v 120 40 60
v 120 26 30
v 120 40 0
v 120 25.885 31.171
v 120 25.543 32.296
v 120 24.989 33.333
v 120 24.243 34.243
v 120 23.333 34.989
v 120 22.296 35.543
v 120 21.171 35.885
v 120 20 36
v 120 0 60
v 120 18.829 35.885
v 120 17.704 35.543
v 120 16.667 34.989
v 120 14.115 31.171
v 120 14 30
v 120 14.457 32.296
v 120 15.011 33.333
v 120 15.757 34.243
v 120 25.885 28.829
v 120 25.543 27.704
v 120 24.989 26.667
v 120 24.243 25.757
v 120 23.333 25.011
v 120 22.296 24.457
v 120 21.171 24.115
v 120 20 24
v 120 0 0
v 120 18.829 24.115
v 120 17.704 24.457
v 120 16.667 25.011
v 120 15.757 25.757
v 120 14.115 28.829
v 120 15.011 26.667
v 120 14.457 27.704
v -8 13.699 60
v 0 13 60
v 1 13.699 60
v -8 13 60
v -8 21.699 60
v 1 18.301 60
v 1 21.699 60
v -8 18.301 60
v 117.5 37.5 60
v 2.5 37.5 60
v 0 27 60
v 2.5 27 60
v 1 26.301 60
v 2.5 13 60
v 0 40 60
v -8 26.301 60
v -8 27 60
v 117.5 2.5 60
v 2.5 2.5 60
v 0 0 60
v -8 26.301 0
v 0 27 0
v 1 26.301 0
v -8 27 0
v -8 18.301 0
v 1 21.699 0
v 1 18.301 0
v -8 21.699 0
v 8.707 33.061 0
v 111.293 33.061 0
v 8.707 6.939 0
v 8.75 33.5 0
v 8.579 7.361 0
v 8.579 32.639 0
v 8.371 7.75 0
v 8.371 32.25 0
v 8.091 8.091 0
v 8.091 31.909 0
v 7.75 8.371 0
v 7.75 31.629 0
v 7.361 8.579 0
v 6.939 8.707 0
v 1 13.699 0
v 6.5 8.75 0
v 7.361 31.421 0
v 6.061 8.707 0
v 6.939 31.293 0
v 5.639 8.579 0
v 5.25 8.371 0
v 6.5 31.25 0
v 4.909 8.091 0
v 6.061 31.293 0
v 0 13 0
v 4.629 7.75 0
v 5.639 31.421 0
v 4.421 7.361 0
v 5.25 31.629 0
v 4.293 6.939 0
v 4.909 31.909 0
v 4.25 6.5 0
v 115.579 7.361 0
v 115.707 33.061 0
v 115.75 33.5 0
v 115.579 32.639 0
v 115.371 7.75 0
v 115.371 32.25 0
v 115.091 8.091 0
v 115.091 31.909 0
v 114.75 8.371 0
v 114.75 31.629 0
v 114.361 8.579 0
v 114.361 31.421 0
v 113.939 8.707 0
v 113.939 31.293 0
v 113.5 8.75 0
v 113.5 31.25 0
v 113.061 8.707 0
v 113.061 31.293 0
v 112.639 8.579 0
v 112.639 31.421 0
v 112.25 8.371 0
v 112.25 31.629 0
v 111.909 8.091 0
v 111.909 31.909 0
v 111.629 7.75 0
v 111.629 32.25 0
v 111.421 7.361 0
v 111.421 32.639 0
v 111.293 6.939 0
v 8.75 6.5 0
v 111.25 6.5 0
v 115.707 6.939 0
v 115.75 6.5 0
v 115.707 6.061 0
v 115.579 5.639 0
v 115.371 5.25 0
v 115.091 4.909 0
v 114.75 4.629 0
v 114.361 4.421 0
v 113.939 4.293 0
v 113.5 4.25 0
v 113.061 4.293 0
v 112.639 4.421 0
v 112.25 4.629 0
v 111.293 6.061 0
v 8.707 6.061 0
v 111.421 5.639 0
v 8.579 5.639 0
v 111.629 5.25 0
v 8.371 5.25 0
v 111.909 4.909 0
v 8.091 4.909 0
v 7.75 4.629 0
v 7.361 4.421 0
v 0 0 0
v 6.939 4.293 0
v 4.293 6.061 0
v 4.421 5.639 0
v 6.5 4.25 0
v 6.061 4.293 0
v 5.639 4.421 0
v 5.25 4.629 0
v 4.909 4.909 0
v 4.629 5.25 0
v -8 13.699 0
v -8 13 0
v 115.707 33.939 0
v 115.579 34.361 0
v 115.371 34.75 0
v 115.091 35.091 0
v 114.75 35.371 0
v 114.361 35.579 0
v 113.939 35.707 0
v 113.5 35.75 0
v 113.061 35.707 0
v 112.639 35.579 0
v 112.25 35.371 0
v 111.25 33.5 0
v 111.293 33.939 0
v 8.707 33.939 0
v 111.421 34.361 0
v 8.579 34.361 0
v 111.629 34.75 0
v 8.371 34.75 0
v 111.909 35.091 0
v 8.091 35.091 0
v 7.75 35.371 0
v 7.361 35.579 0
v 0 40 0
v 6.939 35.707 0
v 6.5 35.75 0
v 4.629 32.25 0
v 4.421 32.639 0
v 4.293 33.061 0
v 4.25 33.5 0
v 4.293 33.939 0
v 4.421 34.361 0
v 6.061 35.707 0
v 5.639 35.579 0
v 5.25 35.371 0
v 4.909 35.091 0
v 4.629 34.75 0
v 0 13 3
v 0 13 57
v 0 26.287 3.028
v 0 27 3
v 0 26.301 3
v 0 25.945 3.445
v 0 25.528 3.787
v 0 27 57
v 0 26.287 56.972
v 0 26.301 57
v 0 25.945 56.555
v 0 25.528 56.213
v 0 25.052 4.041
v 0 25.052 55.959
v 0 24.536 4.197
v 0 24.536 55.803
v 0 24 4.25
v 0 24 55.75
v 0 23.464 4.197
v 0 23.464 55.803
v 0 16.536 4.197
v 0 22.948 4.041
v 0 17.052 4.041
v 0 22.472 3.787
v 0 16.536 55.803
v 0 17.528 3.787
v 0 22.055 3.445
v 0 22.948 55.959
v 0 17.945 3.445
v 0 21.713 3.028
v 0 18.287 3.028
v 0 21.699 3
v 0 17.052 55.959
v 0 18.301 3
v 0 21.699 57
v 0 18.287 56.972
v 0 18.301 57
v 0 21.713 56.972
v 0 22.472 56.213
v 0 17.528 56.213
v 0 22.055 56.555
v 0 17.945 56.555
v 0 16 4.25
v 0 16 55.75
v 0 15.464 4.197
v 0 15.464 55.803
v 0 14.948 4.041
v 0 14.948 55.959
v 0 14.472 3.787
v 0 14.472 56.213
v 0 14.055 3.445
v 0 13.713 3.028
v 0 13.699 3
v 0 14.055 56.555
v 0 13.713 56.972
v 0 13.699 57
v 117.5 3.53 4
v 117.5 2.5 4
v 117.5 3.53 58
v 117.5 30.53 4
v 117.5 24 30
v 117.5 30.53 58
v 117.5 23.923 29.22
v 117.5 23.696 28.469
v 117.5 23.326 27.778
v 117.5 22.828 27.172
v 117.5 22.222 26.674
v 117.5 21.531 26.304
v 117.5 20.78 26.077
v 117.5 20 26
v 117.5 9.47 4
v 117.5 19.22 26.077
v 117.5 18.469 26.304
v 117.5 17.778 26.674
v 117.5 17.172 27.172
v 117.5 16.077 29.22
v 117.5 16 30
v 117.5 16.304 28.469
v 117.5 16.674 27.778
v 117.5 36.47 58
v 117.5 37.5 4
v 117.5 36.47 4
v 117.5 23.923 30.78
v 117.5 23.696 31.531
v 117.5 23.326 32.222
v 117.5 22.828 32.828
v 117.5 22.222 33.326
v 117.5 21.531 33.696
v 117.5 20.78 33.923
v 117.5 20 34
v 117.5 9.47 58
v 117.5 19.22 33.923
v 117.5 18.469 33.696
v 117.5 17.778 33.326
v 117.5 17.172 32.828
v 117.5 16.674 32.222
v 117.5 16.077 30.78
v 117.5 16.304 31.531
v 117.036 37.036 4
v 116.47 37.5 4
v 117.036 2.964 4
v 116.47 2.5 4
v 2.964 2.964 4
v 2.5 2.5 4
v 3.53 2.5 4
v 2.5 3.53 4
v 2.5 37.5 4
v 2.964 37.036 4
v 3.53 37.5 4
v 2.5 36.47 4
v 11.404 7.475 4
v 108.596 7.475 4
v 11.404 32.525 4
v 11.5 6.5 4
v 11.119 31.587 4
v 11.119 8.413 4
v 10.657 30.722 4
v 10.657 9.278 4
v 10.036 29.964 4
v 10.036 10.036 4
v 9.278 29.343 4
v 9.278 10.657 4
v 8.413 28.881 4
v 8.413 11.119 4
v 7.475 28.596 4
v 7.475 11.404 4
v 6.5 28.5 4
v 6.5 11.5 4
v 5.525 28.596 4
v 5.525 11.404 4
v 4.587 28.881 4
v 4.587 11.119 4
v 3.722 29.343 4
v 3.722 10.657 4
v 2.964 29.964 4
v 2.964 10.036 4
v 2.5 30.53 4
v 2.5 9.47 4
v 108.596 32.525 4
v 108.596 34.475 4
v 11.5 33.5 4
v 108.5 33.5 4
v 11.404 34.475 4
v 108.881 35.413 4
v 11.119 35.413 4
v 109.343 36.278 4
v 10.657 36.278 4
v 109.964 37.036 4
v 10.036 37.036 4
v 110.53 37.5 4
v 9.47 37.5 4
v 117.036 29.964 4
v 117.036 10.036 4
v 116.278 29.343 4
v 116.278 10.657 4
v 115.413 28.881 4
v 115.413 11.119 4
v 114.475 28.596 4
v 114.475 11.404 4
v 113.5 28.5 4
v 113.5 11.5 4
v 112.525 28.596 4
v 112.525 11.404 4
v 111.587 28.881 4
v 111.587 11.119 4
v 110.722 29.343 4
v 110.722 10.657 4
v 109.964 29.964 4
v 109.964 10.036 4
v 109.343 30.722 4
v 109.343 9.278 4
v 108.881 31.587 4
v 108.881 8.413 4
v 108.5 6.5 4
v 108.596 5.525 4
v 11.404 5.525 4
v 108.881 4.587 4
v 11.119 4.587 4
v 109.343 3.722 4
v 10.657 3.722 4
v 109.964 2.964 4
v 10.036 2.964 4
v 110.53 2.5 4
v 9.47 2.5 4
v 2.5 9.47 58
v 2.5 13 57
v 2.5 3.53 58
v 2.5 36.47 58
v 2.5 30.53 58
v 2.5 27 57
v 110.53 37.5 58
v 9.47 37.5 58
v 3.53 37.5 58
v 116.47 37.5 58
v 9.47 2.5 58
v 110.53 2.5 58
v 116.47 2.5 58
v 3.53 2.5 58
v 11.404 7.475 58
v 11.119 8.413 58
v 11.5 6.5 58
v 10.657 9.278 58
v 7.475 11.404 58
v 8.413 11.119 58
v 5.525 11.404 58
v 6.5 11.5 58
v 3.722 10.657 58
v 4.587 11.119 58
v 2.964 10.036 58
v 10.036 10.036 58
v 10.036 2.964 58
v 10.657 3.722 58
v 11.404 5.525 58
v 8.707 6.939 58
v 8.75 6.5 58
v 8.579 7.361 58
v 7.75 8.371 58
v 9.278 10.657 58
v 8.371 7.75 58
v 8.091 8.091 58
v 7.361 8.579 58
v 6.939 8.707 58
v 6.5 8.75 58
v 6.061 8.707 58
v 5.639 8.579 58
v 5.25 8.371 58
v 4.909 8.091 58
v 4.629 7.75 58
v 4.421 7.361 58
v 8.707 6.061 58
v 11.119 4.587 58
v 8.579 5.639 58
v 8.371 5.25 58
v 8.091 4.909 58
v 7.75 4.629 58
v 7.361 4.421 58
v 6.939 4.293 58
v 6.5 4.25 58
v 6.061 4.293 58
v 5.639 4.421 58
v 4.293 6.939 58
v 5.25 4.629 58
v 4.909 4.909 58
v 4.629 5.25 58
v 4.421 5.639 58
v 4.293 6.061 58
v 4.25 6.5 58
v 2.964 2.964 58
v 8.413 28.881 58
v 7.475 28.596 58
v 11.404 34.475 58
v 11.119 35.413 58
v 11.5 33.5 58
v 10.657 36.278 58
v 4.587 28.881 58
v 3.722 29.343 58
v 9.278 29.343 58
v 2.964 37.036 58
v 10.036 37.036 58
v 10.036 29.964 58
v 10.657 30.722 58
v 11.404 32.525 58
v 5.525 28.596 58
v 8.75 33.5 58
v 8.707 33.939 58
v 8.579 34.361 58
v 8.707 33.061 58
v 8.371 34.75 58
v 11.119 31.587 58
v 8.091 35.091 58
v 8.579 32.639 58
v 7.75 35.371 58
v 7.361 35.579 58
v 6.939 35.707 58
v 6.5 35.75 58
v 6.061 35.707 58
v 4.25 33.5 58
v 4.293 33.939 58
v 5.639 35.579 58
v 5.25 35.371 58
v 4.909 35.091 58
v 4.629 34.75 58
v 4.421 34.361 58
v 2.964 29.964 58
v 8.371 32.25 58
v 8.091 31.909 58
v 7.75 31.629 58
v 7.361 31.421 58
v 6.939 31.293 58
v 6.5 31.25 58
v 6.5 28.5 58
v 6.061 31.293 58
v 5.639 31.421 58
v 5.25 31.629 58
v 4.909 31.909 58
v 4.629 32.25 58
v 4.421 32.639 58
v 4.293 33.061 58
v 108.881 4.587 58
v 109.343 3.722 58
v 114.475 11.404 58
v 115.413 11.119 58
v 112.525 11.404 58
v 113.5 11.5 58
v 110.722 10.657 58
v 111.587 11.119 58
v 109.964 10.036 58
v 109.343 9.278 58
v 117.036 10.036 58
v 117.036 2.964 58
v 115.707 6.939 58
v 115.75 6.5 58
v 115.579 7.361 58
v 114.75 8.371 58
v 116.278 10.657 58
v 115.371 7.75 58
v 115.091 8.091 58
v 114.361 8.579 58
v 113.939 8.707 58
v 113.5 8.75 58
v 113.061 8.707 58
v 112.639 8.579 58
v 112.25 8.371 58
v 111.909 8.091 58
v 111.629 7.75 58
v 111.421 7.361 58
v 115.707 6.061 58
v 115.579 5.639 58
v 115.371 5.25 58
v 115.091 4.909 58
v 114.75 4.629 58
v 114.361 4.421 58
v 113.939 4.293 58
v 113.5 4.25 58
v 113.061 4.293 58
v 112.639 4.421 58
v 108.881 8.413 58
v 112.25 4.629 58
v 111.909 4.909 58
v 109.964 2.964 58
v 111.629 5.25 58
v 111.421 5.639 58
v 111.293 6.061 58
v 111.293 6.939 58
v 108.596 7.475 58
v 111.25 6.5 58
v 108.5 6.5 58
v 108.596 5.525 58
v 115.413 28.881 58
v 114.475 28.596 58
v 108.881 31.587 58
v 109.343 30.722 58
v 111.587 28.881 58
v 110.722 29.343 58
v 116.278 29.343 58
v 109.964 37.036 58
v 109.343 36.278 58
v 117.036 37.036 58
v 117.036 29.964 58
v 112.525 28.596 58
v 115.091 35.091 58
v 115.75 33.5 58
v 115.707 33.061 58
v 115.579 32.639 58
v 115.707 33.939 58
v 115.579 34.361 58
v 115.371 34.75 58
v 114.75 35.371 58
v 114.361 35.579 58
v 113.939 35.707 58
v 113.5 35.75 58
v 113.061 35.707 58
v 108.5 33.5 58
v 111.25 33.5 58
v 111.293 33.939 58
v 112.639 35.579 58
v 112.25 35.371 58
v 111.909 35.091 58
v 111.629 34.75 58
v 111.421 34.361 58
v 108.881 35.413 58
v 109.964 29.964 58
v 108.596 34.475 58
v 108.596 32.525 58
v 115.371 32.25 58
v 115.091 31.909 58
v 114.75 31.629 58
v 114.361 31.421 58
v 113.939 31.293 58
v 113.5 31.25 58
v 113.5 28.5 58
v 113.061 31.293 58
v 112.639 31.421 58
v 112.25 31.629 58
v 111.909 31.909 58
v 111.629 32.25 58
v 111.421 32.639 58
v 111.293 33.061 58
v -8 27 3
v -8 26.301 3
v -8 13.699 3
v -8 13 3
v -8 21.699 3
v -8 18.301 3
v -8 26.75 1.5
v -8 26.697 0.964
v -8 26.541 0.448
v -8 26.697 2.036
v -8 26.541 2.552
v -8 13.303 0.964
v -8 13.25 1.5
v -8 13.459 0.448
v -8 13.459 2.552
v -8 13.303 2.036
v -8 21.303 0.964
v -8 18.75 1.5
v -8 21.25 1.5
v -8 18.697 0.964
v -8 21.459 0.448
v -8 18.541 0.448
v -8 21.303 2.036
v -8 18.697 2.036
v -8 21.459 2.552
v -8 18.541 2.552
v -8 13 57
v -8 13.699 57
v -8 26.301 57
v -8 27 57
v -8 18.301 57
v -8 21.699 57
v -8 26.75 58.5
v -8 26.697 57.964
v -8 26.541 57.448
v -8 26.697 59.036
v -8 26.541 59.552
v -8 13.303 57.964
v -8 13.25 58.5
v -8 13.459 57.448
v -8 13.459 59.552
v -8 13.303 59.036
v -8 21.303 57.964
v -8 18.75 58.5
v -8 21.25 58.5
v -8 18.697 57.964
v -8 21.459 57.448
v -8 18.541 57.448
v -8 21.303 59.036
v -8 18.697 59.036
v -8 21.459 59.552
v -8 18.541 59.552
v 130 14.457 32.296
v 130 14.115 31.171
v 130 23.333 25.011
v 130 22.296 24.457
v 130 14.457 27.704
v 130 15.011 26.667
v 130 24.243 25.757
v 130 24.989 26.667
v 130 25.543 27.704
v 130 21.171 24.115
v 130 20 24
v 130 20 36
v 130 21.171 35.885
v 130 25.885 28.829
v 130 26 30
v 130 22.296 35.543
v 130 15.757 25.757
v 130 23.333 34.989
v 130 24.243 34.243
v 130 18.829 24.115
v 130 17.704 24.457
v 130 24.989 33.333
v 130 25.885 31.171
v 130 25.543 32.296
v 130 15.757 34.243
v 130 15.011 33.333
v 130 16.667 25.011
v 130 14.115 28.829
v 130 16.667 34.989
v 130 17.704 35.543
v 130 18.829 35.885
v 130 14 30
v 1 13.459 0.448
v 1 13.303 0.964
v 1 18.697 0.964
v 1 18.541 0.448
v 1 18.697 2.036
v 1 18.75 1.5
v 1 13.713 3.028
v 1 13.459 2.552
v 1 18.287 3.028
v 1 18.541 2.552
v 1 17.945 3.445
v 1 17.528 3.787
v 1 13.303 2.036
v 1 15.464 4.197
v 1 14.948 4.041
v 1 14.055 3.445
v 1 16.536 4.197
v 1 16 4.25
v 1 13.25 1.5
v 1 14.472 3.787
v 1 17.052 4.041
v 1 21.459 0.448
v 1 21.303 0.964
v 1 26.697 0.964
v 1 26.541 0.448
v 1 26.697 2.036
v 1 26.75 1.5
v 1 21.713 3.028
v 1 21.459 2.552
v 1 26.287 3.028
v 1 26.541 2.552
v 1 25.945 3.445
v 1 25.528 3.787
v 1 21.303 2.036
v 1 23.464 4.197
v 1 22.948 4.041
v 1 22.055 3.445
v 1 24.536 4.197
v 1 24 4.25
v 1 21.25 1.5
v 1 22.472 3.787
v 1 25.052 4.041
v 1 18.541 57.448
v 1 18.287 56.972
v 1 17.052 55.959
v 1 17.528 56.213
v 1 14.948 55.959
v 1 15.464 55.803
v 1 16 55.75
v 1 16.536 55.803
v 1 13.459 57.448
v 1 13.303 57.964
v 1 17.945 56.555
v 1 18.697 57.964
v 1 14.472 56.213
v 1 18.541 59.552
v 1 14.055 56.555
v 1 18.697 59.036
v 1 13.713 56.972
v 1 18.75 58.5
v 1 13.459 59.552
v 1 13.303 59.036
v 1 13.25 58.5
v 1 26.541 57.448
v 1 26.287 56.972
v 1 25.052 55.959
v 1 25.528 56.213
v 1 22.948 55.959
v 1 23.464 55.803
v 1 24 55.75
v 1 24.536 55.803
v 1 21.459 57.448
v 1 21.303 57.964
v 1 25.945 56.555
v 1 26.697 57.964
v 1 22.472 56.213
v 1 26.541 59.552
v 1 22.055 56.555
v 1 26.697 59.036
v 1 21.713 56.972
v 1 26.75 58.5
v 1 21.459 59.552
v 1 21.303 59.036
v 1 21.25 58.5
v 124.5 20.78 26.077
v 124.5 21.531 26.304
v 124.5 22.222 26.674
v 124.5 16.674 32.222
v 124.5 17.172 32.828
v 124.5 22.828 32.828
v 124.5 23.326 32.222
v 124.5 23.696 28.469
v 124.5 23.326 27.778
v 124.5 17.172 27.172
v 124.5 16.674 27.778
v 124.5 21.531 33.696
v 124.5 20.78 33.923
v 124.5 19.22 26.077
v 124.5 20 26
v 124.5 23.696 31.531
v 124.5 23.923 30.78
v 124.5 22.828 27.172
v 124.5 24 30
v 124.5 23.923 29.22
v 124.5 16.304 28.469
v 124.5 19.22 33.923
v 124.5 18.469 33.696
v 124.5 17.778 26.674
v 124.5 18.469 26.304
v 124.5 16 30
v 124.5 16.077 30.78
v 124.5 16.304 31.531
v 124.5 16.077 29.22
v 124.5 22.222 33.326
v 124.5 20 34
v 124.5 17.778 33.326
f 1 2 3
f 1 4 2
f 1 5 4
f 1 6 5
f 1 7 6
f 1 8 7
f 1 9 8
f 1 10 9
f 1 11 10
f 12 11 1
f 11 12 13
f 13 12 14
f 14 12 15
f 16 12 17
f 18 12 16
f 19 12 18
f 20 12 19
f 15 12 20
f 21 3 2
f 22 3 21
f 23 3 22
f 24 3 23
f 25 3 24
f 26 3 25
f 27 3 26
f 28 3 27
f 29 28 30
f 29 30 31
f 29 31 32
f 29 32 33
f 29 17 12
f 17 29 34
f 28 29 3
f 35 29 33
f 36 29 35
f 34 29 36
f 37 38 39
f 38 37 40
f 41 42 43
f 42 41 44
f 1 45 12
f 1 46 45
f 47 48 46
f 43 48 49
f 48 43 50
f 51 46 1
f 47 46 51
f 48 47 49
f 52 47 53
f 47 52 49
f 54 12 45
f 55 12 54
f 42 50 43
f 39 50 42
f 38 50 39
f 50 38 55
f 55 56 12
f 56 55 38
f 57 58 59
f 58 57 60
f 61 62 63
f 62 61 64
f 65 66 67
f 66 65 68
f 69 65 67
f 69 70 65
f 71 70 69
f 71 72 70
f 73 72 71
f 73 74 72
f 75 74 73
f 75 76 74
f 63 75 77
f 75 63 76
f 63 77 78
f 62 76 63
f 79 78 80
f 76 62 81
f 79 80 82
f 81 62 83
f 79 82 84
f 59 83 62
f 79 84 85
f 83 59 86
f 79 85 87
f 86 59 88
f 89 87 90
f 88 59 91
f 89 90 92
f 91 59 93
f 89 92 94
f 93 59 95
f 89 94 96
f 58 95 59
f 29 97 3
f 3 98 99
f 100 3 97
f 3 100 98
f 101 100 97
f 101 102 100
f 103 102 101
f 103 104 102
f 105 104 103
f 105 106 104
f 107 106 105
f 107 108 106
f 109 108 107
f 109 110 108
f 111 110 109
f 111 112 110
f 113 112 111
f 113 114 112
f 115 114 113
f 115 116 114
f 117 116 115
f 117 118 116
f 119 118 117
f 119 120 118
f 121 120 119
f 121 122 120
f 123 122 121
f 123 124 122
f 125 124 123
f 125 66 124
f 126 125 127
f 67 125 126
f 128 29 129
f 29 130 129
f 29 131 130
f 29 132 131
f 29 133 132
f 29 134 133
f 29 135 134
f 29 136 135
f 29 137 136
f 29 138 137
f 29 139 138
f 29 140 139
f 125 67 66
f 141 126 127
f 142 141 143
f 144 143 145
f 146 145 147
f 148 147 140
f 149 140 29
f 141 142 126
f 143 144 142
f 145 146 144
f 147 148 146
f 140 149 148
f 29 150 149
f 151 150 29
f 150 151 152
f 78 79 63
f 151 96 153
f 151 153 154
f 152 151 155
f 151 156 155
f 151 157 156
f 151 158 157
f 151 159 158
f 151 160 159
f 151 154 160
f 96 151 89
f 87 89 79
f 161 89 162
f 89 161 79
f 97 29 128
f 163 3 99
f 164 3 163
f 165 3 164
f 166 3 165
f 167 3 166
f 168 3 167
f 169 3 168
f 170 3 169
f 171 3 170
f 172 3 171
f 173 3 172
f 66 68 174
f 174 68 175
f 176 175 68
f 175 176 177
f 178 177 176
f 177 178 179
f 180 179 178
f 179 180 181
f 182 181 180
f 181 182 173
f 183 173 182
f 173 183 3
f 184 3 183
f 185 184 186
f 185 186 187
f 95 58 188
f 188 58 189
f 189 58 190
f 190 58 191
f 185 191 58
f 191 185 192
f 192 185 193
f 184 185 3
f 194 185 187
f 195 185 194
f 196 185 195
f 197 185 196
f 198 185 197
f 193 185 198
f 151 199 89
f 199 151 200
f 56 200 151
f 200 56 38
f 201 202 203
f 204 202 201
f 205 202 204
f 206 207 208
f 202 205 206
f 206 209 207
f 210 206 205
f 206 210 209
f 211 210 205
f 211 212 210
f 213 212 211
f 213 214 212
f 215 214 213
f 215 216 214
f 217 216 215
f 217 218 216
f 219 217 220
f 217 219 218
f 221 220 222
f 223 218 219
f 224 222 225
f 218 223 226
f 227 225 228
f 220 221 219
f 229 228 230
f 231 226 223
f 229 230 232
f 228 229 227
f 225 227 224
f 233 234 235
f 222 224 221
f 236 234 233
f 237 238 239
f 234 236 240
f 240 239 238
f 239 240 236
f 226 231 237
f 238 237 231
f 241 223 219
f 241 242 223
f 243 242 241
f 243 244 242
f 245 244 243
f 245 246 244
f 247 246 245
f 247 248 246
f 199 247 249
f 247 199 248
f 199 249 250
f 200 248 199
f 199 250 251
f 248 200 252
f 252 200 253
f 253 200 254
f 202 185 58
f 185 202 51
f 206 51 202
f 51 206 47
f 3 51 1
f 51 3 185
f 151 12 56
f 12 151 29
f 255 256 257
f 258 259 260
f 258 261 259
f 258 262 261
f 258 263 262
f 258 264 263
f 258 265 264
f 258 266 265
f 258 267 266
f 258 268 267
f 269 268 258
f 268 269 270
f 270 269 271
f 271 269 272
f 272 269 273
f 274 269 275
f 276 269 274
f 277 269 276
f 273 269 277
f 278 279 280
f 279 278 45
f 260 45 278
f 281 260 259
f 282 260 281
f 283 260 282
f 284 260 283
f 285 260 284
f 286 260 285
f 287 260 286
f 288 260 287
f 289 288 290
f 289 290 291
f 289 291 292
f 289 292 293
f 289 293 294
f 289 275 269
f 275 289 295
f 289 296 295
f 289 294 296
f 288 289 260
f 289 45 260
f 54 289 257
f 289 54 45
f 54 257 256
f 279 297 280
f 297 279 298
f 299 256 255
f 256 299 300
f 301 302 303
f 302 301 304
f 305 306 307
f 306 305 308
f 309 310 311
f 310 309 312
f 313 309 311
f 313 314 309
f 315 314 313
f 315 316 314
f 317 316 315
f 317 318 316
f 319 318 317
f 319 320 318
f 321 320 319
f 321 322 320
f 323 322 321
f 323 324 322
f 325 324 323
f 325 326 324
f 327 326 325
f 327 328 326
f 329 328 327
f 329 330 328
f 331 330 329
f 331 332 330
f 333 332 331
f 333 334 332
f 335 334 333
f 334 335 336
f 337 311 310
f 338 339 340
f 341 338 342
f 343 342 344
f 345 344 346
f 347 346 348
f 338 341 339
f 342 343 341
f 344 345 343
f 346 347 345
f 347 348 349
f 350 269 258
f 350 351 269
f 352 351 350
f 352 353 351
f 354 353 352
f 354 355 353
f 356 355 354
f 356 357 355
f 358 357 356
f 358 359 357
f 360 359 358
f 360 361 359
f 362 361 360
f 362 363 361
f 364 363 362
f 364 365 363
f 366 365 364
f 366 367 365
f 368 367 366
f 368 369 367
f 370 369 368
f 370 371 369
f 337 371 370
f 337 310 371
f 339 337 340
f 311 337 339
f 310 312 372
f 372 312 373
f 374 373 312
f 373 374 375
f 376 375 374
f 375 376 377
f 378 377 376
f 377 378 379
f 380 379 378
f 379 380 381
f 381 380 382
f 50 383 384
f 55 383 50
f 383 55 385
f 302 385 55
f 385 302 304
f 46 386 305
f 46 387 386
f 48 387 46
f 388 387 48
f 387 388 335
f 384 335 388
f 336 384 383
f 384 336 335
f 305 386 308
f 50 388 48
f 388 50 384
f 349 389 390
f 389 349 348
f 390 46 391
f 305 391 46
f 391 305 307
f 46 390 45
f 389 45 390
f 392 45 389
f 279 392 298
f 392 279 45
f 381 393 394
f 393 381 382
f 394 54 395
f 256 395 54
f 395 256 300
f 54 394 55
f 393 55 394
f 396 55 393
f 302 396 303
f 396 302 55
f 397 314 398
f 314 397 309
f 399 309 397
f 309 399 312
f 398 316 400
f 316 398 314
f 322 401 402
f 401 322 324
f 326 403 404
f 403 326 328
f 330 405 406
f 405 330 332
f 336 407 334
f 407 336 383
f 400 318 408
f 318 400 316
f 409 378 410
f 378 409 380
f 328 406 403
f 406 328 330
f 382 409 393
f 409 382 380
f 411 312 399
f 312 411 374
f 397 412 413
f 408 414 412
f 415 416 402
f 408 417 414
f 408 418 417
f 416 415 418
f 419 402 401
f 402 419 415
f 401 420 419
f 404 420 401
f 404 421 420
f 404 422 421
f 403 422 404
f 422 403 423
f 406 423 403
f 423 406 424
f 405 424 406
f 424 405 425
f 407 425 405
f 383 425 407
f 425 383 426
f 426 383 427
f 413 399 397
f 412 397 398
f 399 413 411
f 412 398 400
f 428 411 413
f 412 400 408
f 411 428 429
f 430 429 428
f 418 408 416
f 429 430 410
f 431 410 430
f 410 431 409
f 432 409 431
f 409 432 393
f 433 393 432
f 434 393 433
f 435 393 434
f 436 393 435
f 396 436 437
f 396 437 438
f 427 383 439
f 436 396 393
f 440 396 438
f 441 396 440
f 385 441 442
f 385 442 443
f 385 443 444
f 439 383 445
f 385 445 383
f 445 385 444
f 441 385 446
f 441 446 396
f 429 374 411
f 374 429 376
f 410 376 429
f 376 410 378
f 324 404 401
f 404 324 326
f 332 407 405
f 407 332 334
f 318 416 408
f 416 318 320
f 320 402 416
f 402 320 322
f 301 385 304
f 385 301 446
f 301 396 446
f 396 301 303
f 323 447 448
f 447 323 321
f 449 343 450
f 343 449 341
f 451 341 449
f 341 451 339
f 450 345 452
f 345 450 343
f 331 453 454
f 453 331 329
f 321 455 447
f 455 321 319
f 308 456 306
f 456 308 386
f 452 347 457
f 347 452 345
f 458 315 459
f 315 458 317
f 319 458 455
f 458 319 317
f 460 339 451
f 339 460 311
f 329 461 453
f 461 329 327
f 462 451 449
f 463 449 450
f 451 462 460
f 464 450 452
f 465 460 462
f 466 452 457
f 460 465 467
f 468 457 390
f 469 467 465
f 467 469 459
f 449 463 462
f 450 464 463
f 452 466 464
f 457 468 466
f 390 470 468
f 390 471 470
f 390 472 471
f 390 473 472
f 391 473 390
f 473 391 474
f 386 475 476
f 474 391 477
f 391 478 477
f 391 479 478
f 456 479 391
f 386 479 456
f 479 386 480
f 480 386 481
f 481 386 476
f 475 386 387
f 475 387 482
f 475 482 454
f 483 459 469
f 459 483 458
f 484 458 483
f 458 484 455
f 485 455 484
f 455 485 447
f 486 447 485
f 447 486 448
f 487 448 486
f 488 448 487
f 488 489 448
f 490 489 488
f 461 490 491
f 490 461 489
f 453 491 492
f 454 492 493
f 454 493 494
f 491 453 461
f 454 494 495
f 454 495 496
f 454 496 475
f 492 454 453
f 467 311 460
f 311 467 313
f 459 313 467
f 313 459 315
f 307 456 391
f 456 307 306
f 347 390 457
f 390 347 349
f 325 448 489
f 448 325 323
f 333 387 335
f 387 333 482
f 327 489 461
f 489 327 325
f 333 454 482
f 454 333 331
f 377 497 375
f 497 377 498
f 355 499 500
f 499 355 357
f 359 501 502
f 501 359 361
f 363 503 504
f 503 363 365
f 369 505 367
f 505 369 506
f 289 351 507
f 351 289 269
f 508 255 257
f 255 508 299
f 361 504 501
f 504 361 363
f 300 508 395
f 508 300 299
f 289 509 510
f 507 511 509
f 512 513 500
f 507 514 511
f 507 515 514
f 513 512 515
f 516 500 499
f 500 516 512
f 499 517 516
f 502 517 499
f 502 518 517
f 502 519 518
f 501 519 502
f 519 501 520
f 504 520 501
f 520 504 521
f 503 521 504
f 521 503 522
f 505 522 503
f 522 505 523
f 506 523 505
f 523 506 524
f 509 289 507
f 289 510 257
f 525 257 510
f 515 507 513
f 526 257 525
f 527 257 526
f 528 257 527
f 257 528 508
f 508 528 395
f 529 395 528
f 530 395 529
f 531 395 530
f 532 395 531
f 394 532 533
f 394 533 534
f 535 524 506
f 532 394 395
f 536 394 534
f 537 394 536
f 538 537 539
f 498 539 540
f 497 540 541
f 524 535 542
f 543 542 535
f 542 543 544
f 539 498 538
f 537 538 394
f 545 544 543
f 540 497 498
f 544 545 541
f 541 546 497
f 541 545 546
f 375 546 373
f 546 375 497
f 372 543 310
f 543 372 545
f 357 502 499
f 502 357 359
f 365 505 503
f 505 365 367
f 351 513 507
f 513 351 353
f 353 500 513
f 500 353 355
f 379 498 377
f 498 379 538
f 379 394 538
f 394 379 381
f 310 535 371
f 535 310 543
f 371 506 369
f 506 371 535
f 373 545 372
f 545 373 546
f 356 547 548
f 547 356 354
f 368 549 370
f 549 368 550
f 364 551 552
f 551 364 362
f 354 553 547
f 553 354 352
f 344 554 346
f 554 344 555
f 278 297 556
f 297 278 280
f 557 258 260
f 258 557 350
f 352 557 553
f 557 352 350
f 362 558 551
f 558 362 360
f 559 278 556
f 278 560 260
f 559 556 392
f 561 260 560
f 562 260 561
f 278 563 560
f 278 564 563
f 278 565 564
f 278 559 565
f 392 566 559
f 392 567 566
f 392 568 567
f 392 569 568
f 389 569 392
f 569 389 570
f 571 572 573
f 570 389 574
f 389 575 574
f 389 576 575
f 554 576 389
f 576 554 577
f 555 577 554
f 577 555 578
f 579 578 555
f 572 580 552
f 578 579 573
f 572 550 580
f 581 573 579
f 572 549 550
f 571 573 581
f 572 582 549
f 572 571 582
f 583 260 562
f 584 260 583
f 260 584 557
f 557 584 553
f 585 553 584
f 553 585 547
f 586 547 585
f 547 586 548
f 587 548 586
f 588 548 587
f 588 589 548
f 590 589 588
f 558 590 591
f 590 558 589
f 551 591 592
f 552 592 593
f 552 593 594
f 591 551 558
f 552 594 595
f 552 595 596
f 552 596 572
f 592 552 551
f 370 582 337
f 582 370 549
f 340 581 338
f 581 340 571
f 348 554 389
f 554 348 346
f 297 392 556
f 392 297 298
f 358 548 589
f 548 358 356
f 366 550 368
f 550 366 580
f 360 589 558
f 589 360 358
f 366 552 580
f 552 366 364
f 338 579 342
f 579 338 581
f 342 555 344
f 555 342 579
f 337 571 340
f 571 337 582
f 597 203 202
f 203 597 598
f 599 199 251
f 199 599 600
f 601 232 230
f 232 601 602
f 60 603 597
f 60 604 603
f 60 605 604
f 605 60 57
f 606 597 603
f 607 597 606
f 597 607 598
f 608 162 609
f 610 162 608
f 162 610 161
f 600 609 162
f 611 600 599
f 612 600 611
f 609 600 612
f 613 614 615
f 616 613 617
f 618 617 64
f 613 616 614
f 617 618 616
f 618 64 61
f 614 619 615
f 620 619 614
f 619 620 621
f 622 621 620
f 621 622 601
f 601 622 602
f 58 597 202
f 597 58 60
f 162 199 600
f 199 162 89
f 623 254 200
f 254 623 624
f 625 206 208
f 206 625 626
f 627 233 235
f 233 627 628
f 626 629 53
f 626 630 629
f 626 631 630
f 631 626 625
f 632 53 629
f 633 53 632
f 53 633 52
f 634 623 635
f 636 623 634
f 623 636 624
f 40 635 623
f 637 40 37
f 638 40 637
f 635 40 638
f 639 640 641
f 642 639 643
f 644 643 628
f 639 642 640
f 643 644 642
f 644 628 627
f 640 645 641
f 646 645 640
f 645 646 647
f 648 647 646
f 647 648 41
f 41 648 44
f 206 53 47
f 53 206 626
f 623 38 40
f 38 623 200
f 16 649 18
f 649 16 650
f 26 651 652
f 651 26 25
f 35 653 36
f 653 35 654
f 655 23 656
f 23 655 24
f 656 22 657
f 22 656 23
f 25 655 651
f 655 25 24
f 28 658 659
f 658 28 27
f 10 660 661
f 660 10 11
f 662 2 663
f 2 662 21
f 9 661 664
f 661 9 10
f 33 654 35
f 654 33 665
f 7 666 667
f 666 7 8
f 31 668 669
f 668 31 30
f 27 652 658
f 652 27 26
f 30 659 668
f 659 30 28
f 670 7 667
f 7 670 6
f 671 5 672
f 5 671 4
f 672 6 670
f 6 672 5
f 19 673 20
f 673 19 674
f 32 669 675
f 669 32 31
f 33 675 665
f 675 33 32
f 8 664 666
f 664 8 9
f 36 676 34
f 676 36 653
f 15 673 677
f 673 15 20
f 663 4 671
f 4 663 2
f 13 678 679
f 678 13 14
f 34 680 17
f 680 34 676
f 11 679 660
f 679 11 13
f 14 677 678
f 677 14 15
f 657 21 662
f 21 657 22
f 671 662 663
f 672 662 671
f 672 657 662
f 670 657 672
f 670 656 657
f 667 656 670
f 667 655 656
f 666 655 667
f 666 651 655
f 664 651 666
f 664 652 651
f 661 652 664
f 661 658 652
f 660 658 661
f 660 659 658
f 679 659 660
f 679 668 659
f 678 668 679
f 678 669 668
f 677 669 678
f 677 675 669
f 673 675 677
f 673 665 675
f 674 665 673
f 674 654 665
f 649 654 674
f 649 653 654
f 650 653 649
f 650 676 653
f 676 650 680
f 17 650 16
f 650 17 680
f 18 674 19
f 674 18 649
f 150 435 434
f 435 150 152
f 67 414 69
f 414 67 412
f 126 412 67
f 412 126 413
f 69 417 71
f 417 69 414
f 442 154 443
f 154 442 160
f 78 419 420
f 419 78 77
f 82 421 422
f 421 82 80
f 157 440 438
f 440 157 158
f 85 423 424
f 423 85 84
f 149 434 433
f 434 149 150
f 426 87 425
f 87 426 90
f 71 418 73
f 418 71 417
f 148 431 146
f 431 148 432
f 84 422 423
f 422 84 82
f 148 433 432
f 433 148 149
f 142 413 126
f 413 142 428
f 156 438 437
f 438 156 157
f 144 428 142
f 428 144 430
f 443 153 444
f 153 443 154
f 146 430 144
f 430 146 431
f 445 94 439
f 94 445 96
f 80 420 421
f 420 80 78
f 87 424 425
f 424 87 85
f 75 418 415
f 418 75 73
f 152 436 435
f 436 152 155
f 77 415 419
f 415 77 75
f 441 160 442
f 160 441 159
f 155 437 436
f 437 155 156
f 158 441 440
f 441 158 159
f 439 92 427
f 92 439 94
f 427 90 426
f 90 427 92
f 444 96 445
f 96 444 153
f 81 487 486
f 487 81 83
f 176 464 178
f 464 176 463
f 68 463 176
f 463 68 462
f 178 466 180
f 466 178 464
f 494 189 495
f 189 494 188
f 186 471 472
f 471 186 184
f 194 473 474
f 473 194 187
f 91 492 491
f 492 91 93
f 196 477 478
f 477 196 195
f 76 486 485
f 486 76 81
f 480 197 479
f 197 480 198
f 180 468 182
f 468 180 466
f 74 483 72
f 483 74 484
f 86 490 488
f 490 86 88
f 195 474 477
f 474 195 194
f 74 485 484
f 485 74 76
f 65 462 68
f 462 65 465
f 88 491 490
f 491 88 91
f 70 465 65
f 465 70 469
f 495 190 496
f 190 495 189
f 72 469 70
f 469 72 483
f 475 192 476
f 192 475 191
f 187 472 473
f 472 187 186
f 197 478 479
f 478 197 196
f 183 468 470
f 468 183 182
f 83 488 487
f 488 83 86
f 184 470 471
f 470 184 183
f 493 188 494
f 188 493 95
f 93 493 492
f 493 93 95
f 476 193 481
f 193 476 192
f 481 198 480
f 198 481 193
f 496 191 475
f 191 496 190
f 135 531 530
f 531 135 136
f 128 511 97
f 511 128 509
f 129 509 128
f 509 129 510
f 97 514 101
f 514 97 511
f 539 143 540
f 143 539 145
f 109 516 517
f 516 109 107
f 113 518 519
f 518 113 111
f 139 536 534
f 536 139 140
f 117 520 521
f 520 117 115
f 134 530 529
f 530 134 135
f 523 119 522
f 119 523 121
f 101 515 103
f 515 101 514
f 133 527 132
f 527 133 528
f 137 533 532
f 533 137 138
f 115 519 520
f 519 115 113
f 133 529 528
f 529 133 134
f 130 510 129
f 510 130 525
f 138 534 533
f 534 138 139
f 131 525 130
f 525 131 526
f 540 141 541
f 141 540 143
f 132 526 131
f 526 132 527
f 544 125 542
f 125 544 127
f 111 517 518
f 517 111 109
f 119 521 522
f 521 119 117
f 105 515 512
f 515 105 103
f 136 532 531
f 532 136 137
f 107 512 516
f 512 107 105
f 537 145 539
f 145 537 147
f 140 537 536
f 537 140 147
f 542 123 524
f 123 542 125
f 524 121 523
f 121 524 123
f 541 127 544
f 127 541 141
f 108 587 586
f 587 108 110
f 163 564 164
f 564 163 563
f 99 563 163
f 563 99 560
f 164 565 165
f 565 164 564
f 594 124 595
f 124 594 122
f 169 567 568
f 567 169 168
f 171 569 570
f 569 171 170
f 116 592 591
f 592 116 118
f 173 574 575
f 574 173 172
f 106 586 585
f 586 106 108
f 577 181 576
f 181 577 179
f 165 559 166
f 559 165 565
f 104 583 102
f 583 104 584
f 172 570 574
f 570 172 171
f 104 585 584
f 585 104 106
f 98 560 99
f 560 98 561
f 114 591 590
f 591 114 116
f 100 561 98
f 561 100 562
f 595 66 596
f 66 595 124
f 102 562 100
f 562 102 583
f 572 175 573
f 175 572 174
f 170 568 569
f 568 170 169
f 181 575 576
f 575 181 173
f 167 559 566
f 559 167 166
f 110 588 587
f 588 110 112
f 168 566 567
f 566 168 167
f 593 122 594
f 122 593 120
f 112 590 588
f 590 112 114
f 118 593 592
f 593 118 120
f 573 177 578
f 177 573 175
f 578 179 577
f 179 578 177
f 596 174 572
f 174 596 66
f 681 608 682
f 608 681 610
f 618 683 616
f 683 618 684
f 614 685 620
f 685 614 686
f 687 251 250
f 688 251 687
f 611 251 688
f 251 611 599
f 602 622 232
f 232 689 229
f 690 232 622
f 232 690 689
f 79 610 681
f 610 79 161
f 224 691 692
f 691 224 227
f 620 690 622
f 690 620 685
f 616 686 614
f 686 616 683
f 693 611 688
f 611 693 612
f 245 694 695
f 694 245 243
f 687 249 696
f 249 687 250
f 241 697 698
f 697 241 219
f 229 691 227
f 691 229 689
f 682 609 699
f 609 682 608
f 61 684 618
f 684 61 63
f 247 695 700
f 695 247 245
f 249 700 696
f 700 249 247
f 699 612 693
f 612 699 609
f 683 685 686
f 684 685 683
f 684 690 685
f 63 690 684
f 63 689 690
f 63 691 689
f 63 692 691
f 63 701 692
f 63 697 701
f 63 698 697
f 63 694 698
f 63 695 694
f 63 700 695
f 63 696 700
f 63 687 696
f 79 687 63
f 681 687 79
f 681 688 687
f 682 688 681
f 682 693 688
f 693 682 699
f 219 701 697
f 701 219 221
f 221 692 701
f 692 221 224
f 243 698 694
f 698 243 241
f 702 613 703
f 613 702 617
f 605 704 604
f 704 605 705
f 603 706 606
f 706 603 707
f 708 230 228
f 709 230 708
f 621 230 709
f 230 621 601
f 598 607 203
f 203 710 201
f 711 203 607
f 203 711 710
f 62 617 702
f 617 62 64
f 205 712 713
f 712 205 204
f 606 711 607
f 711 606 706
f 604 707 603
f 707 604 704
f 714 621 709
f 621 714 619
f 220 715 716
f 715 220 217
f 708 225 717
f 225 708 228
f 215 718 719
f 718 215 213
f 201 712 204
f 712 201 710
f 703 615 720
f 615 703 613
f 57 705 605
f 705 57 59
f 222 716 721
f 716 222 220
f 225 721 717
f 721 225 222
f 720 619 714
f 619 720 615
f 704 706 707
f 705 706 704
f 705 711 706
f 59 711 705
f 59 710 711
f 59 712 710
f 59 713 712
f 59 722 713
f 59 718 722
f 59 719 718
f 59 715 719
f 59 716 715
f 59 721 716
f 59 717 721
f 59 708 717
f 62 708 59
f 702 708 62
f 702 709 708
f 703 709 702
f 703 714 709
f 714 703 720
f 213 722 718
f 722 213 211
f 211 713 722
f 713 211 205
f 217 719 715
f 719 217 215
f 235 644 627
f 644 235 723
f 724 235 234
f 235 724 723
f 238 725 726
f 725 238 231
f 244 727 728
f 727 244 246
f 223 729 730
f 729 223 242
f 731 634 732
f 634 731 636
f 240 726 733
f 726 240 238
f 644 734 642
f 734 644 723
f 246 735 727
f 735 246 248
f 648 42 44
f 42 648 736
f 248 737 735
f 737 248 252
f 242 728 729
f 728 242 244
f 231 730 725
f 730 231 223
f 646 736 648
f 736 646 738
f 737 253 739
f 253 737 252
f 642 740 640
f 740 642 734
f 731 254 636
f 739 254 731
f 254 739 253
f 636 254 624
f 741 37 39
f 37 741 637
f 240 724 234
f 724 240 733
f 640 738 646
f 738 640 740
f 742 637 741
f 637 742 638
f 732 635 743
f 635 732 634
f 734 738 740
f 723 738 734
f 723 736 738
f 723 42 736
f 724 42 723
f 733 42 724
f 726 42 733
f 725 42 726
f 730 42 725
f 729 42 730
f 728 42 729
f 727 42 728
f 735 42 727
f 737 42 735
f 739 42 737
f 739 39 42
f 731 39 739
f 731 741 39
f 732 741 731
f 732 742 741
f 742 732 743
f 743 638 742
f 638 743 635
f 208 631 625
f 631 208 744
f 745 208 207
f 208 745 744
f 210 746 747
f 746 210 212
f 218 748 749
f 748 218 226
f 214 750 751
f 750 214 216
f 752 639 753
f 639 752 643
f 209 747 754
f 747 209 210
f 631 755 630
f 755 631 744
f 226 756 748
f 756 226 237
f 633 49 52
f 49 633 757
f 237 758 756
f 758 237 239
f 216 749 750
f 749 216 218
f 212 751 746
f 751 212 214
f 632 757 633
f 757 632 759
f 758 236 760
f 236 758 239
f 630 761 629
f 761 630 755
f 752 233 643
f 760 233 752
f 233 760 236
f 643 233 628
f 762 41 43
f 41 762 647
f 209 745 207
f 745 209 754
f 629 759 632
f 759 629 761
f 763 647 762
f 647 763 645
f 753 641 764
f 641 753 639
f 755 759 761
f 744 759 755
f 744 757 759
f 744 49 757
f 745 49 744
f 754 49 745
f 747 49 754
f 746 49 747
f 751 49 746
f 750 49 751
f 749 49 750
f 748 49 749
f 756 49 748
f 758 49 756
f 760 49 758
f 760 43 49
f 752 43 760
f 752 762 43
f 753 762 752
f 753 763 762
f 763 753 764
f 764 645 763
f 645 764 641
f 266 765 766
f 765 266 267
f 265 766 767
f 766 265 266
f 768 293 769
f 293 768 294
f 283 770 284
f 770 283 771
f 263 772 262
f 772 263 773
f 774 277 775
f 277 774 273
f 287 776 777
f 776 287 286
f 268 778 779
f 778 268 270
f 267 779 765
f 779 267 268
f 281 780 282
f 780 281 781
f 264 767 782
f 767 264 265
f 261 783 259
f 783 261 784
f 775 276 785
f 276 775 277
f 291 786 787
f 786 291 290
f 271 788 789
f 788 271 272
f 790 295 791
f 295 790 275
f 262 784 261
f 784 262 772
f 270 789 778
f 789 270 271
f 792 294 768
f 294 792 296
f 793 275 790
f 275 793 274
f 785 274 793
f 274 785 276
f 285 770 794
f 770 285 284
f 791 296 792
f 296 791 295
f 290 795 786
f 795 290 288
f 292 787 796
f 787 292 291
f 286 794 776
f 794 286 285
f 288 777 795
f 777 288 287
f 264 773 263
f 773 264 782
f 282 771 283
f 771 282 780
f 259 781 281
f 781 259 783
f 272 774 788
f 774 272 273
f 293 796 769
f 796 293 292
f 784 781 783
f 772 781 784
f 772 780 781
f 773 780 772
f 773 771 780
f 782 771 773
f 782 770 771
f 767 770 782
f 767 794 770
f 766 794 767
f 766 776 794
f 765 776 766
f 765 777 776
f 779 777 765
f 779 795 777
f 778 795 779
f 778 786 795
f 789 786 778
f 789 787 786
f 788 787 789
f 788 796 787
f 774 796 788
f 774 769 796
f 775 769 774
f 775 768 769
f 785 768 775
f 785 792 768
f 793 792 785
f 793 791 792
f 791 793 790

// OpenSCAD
$fn = 32;

// ----------------------------------------------------------------------
// Enclosure body: 120 x 40 x 60 mm, wall 2.5 mm
// ----------------------------------------------------------------------

// --- parameters (mm) ---
length = 120;             // outside length, X
width = 40;               // outside width, Y
height = 60;              // outside height, Z
wall = 2.5;               // side wall thickness
floor_t = 4;              // floor thickness
boss_d = 10;              // corner boss diameter
boss_h = 54;              // corner boss height above the floor
boss_hole_d = 4.5;        // lid screw clearance in the boss
boss_lip = 6.5;           // boss centre inset from the corner
ear_w = 14;               // mounting ear width
ear_t = 3;                // mounting ear thickness
ear_ext = 8;              // mounting ear reach
ear_hole_d = 5.5;         // mounting ear drills
nipple_d = 12;            // cable gland boss diameter
nipple_h = 10;            // cable gland boss height
nipple_bore = 8;          // cable gland bore

module shell() {
  difference() {
    cube([length, width, height]);
    /* hollow, open at the top */
    translate([wall, wall, floor_t])
      cube([length - 2 * wall, width - 2 * wall, height]);
  }
}

module bosses() {
  /* corner bosses, sunk 1 mm into the floor */
  for (sx = [0, 1]) for (sy = [0, 1])
    translate([sx * (length - 2 * boss_lip) + boss_lip, sy * (width - 2 * boss_lip) + boss_lip, floor_t - 1])
      cylinder(h = boss_h + 1, d = boss_d);
}

module gland() {
  /* boss on the short wall, sunk 1 mm into it */
  translate([length - 1, width / 2, height * 0.5]) rotate([0, 90, 0])
    cylinder(h = nipple_h + 1, d = nipple_d);
}

module ears() {
  /* mounting ears on the short walls, sunk into the wall */
  for (sz = [0, 1])
    translate([-ear_ext, width / 2 - ear_w / 2, sz * (height - ear_t)])
      cube([ear_ext + 2.5, ear_w, ear_t]);
}

difference() {
  union() {
    shell();
    bosses();
    gland();
    ears();
  }
  /* boss screw holes */
  for (sx = [0, 1]) for (sy = [0, 1])
    translate([sx * (length - 2 * boss_lip) + boss_lip, sy * (width - 2 * boss_lip) + boss_lip, -1]) cylinder(h = floor_t + boss_h + 2, d = boss_hole_d);
  translate([length, width / 2, height * 0.5]) rotate([0, 90, 0]) translate([0, 0, -nipple_h - 2]) cylinder(h = nipple_h + wall + 4, d = nipple_bore);
  for (sz = [0, 1]) for (sx = [0, 1]) translate([-ear_ext - 1, width / 2 + (2 * sx - 1) * (ear_w / 2 - 3), sz * (height - ear_t) + ear_t / 2]) rotate([0, 90, 0]) cylinder(h = ear_ext + 2, d = ear_hole_d);
}
